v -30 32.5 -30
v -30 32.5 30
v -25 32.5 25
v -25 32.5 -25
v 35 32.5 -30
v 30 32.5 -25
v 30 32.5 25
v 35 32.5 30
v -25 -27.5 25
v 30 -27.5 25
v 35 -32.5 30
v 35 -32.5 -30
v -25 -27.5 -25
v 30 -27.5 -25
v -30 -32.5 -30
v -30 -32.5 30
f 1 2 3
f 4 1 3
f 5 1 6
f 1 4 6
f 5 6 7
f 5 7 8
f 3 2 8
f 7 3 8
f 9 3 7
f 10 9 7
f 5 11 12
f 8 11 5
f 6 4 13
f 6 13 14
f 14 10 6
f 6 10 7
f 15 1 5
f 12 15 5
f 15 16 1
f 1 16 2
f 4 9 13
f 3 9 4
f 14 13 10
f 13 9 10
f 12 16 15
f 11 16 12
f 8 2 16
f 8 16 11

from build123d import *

# Parameters (mm, degrees)
F0_W     = 65
F0_H     = 65
F1_DEPTH = 30
F2_T     = -5


with BuildPart() as f1:
    # F0 (on Top) → F1 (new body, symmetric)
    with BuildSketch(Plane.XY):
        with Locations((2.5, 0)):
            Rectangle(F0_W, F0_H)
    extrude(amount=F1_DEPTH, both=True)

    # F2
    f2_openings = [f1.faces().sort_by_distance(p)[0] for p in [
        (2.5, 32.5, 0),
    ]]
    offset(amount=F2_T, openings=f2_openings)


solid = f1.part
